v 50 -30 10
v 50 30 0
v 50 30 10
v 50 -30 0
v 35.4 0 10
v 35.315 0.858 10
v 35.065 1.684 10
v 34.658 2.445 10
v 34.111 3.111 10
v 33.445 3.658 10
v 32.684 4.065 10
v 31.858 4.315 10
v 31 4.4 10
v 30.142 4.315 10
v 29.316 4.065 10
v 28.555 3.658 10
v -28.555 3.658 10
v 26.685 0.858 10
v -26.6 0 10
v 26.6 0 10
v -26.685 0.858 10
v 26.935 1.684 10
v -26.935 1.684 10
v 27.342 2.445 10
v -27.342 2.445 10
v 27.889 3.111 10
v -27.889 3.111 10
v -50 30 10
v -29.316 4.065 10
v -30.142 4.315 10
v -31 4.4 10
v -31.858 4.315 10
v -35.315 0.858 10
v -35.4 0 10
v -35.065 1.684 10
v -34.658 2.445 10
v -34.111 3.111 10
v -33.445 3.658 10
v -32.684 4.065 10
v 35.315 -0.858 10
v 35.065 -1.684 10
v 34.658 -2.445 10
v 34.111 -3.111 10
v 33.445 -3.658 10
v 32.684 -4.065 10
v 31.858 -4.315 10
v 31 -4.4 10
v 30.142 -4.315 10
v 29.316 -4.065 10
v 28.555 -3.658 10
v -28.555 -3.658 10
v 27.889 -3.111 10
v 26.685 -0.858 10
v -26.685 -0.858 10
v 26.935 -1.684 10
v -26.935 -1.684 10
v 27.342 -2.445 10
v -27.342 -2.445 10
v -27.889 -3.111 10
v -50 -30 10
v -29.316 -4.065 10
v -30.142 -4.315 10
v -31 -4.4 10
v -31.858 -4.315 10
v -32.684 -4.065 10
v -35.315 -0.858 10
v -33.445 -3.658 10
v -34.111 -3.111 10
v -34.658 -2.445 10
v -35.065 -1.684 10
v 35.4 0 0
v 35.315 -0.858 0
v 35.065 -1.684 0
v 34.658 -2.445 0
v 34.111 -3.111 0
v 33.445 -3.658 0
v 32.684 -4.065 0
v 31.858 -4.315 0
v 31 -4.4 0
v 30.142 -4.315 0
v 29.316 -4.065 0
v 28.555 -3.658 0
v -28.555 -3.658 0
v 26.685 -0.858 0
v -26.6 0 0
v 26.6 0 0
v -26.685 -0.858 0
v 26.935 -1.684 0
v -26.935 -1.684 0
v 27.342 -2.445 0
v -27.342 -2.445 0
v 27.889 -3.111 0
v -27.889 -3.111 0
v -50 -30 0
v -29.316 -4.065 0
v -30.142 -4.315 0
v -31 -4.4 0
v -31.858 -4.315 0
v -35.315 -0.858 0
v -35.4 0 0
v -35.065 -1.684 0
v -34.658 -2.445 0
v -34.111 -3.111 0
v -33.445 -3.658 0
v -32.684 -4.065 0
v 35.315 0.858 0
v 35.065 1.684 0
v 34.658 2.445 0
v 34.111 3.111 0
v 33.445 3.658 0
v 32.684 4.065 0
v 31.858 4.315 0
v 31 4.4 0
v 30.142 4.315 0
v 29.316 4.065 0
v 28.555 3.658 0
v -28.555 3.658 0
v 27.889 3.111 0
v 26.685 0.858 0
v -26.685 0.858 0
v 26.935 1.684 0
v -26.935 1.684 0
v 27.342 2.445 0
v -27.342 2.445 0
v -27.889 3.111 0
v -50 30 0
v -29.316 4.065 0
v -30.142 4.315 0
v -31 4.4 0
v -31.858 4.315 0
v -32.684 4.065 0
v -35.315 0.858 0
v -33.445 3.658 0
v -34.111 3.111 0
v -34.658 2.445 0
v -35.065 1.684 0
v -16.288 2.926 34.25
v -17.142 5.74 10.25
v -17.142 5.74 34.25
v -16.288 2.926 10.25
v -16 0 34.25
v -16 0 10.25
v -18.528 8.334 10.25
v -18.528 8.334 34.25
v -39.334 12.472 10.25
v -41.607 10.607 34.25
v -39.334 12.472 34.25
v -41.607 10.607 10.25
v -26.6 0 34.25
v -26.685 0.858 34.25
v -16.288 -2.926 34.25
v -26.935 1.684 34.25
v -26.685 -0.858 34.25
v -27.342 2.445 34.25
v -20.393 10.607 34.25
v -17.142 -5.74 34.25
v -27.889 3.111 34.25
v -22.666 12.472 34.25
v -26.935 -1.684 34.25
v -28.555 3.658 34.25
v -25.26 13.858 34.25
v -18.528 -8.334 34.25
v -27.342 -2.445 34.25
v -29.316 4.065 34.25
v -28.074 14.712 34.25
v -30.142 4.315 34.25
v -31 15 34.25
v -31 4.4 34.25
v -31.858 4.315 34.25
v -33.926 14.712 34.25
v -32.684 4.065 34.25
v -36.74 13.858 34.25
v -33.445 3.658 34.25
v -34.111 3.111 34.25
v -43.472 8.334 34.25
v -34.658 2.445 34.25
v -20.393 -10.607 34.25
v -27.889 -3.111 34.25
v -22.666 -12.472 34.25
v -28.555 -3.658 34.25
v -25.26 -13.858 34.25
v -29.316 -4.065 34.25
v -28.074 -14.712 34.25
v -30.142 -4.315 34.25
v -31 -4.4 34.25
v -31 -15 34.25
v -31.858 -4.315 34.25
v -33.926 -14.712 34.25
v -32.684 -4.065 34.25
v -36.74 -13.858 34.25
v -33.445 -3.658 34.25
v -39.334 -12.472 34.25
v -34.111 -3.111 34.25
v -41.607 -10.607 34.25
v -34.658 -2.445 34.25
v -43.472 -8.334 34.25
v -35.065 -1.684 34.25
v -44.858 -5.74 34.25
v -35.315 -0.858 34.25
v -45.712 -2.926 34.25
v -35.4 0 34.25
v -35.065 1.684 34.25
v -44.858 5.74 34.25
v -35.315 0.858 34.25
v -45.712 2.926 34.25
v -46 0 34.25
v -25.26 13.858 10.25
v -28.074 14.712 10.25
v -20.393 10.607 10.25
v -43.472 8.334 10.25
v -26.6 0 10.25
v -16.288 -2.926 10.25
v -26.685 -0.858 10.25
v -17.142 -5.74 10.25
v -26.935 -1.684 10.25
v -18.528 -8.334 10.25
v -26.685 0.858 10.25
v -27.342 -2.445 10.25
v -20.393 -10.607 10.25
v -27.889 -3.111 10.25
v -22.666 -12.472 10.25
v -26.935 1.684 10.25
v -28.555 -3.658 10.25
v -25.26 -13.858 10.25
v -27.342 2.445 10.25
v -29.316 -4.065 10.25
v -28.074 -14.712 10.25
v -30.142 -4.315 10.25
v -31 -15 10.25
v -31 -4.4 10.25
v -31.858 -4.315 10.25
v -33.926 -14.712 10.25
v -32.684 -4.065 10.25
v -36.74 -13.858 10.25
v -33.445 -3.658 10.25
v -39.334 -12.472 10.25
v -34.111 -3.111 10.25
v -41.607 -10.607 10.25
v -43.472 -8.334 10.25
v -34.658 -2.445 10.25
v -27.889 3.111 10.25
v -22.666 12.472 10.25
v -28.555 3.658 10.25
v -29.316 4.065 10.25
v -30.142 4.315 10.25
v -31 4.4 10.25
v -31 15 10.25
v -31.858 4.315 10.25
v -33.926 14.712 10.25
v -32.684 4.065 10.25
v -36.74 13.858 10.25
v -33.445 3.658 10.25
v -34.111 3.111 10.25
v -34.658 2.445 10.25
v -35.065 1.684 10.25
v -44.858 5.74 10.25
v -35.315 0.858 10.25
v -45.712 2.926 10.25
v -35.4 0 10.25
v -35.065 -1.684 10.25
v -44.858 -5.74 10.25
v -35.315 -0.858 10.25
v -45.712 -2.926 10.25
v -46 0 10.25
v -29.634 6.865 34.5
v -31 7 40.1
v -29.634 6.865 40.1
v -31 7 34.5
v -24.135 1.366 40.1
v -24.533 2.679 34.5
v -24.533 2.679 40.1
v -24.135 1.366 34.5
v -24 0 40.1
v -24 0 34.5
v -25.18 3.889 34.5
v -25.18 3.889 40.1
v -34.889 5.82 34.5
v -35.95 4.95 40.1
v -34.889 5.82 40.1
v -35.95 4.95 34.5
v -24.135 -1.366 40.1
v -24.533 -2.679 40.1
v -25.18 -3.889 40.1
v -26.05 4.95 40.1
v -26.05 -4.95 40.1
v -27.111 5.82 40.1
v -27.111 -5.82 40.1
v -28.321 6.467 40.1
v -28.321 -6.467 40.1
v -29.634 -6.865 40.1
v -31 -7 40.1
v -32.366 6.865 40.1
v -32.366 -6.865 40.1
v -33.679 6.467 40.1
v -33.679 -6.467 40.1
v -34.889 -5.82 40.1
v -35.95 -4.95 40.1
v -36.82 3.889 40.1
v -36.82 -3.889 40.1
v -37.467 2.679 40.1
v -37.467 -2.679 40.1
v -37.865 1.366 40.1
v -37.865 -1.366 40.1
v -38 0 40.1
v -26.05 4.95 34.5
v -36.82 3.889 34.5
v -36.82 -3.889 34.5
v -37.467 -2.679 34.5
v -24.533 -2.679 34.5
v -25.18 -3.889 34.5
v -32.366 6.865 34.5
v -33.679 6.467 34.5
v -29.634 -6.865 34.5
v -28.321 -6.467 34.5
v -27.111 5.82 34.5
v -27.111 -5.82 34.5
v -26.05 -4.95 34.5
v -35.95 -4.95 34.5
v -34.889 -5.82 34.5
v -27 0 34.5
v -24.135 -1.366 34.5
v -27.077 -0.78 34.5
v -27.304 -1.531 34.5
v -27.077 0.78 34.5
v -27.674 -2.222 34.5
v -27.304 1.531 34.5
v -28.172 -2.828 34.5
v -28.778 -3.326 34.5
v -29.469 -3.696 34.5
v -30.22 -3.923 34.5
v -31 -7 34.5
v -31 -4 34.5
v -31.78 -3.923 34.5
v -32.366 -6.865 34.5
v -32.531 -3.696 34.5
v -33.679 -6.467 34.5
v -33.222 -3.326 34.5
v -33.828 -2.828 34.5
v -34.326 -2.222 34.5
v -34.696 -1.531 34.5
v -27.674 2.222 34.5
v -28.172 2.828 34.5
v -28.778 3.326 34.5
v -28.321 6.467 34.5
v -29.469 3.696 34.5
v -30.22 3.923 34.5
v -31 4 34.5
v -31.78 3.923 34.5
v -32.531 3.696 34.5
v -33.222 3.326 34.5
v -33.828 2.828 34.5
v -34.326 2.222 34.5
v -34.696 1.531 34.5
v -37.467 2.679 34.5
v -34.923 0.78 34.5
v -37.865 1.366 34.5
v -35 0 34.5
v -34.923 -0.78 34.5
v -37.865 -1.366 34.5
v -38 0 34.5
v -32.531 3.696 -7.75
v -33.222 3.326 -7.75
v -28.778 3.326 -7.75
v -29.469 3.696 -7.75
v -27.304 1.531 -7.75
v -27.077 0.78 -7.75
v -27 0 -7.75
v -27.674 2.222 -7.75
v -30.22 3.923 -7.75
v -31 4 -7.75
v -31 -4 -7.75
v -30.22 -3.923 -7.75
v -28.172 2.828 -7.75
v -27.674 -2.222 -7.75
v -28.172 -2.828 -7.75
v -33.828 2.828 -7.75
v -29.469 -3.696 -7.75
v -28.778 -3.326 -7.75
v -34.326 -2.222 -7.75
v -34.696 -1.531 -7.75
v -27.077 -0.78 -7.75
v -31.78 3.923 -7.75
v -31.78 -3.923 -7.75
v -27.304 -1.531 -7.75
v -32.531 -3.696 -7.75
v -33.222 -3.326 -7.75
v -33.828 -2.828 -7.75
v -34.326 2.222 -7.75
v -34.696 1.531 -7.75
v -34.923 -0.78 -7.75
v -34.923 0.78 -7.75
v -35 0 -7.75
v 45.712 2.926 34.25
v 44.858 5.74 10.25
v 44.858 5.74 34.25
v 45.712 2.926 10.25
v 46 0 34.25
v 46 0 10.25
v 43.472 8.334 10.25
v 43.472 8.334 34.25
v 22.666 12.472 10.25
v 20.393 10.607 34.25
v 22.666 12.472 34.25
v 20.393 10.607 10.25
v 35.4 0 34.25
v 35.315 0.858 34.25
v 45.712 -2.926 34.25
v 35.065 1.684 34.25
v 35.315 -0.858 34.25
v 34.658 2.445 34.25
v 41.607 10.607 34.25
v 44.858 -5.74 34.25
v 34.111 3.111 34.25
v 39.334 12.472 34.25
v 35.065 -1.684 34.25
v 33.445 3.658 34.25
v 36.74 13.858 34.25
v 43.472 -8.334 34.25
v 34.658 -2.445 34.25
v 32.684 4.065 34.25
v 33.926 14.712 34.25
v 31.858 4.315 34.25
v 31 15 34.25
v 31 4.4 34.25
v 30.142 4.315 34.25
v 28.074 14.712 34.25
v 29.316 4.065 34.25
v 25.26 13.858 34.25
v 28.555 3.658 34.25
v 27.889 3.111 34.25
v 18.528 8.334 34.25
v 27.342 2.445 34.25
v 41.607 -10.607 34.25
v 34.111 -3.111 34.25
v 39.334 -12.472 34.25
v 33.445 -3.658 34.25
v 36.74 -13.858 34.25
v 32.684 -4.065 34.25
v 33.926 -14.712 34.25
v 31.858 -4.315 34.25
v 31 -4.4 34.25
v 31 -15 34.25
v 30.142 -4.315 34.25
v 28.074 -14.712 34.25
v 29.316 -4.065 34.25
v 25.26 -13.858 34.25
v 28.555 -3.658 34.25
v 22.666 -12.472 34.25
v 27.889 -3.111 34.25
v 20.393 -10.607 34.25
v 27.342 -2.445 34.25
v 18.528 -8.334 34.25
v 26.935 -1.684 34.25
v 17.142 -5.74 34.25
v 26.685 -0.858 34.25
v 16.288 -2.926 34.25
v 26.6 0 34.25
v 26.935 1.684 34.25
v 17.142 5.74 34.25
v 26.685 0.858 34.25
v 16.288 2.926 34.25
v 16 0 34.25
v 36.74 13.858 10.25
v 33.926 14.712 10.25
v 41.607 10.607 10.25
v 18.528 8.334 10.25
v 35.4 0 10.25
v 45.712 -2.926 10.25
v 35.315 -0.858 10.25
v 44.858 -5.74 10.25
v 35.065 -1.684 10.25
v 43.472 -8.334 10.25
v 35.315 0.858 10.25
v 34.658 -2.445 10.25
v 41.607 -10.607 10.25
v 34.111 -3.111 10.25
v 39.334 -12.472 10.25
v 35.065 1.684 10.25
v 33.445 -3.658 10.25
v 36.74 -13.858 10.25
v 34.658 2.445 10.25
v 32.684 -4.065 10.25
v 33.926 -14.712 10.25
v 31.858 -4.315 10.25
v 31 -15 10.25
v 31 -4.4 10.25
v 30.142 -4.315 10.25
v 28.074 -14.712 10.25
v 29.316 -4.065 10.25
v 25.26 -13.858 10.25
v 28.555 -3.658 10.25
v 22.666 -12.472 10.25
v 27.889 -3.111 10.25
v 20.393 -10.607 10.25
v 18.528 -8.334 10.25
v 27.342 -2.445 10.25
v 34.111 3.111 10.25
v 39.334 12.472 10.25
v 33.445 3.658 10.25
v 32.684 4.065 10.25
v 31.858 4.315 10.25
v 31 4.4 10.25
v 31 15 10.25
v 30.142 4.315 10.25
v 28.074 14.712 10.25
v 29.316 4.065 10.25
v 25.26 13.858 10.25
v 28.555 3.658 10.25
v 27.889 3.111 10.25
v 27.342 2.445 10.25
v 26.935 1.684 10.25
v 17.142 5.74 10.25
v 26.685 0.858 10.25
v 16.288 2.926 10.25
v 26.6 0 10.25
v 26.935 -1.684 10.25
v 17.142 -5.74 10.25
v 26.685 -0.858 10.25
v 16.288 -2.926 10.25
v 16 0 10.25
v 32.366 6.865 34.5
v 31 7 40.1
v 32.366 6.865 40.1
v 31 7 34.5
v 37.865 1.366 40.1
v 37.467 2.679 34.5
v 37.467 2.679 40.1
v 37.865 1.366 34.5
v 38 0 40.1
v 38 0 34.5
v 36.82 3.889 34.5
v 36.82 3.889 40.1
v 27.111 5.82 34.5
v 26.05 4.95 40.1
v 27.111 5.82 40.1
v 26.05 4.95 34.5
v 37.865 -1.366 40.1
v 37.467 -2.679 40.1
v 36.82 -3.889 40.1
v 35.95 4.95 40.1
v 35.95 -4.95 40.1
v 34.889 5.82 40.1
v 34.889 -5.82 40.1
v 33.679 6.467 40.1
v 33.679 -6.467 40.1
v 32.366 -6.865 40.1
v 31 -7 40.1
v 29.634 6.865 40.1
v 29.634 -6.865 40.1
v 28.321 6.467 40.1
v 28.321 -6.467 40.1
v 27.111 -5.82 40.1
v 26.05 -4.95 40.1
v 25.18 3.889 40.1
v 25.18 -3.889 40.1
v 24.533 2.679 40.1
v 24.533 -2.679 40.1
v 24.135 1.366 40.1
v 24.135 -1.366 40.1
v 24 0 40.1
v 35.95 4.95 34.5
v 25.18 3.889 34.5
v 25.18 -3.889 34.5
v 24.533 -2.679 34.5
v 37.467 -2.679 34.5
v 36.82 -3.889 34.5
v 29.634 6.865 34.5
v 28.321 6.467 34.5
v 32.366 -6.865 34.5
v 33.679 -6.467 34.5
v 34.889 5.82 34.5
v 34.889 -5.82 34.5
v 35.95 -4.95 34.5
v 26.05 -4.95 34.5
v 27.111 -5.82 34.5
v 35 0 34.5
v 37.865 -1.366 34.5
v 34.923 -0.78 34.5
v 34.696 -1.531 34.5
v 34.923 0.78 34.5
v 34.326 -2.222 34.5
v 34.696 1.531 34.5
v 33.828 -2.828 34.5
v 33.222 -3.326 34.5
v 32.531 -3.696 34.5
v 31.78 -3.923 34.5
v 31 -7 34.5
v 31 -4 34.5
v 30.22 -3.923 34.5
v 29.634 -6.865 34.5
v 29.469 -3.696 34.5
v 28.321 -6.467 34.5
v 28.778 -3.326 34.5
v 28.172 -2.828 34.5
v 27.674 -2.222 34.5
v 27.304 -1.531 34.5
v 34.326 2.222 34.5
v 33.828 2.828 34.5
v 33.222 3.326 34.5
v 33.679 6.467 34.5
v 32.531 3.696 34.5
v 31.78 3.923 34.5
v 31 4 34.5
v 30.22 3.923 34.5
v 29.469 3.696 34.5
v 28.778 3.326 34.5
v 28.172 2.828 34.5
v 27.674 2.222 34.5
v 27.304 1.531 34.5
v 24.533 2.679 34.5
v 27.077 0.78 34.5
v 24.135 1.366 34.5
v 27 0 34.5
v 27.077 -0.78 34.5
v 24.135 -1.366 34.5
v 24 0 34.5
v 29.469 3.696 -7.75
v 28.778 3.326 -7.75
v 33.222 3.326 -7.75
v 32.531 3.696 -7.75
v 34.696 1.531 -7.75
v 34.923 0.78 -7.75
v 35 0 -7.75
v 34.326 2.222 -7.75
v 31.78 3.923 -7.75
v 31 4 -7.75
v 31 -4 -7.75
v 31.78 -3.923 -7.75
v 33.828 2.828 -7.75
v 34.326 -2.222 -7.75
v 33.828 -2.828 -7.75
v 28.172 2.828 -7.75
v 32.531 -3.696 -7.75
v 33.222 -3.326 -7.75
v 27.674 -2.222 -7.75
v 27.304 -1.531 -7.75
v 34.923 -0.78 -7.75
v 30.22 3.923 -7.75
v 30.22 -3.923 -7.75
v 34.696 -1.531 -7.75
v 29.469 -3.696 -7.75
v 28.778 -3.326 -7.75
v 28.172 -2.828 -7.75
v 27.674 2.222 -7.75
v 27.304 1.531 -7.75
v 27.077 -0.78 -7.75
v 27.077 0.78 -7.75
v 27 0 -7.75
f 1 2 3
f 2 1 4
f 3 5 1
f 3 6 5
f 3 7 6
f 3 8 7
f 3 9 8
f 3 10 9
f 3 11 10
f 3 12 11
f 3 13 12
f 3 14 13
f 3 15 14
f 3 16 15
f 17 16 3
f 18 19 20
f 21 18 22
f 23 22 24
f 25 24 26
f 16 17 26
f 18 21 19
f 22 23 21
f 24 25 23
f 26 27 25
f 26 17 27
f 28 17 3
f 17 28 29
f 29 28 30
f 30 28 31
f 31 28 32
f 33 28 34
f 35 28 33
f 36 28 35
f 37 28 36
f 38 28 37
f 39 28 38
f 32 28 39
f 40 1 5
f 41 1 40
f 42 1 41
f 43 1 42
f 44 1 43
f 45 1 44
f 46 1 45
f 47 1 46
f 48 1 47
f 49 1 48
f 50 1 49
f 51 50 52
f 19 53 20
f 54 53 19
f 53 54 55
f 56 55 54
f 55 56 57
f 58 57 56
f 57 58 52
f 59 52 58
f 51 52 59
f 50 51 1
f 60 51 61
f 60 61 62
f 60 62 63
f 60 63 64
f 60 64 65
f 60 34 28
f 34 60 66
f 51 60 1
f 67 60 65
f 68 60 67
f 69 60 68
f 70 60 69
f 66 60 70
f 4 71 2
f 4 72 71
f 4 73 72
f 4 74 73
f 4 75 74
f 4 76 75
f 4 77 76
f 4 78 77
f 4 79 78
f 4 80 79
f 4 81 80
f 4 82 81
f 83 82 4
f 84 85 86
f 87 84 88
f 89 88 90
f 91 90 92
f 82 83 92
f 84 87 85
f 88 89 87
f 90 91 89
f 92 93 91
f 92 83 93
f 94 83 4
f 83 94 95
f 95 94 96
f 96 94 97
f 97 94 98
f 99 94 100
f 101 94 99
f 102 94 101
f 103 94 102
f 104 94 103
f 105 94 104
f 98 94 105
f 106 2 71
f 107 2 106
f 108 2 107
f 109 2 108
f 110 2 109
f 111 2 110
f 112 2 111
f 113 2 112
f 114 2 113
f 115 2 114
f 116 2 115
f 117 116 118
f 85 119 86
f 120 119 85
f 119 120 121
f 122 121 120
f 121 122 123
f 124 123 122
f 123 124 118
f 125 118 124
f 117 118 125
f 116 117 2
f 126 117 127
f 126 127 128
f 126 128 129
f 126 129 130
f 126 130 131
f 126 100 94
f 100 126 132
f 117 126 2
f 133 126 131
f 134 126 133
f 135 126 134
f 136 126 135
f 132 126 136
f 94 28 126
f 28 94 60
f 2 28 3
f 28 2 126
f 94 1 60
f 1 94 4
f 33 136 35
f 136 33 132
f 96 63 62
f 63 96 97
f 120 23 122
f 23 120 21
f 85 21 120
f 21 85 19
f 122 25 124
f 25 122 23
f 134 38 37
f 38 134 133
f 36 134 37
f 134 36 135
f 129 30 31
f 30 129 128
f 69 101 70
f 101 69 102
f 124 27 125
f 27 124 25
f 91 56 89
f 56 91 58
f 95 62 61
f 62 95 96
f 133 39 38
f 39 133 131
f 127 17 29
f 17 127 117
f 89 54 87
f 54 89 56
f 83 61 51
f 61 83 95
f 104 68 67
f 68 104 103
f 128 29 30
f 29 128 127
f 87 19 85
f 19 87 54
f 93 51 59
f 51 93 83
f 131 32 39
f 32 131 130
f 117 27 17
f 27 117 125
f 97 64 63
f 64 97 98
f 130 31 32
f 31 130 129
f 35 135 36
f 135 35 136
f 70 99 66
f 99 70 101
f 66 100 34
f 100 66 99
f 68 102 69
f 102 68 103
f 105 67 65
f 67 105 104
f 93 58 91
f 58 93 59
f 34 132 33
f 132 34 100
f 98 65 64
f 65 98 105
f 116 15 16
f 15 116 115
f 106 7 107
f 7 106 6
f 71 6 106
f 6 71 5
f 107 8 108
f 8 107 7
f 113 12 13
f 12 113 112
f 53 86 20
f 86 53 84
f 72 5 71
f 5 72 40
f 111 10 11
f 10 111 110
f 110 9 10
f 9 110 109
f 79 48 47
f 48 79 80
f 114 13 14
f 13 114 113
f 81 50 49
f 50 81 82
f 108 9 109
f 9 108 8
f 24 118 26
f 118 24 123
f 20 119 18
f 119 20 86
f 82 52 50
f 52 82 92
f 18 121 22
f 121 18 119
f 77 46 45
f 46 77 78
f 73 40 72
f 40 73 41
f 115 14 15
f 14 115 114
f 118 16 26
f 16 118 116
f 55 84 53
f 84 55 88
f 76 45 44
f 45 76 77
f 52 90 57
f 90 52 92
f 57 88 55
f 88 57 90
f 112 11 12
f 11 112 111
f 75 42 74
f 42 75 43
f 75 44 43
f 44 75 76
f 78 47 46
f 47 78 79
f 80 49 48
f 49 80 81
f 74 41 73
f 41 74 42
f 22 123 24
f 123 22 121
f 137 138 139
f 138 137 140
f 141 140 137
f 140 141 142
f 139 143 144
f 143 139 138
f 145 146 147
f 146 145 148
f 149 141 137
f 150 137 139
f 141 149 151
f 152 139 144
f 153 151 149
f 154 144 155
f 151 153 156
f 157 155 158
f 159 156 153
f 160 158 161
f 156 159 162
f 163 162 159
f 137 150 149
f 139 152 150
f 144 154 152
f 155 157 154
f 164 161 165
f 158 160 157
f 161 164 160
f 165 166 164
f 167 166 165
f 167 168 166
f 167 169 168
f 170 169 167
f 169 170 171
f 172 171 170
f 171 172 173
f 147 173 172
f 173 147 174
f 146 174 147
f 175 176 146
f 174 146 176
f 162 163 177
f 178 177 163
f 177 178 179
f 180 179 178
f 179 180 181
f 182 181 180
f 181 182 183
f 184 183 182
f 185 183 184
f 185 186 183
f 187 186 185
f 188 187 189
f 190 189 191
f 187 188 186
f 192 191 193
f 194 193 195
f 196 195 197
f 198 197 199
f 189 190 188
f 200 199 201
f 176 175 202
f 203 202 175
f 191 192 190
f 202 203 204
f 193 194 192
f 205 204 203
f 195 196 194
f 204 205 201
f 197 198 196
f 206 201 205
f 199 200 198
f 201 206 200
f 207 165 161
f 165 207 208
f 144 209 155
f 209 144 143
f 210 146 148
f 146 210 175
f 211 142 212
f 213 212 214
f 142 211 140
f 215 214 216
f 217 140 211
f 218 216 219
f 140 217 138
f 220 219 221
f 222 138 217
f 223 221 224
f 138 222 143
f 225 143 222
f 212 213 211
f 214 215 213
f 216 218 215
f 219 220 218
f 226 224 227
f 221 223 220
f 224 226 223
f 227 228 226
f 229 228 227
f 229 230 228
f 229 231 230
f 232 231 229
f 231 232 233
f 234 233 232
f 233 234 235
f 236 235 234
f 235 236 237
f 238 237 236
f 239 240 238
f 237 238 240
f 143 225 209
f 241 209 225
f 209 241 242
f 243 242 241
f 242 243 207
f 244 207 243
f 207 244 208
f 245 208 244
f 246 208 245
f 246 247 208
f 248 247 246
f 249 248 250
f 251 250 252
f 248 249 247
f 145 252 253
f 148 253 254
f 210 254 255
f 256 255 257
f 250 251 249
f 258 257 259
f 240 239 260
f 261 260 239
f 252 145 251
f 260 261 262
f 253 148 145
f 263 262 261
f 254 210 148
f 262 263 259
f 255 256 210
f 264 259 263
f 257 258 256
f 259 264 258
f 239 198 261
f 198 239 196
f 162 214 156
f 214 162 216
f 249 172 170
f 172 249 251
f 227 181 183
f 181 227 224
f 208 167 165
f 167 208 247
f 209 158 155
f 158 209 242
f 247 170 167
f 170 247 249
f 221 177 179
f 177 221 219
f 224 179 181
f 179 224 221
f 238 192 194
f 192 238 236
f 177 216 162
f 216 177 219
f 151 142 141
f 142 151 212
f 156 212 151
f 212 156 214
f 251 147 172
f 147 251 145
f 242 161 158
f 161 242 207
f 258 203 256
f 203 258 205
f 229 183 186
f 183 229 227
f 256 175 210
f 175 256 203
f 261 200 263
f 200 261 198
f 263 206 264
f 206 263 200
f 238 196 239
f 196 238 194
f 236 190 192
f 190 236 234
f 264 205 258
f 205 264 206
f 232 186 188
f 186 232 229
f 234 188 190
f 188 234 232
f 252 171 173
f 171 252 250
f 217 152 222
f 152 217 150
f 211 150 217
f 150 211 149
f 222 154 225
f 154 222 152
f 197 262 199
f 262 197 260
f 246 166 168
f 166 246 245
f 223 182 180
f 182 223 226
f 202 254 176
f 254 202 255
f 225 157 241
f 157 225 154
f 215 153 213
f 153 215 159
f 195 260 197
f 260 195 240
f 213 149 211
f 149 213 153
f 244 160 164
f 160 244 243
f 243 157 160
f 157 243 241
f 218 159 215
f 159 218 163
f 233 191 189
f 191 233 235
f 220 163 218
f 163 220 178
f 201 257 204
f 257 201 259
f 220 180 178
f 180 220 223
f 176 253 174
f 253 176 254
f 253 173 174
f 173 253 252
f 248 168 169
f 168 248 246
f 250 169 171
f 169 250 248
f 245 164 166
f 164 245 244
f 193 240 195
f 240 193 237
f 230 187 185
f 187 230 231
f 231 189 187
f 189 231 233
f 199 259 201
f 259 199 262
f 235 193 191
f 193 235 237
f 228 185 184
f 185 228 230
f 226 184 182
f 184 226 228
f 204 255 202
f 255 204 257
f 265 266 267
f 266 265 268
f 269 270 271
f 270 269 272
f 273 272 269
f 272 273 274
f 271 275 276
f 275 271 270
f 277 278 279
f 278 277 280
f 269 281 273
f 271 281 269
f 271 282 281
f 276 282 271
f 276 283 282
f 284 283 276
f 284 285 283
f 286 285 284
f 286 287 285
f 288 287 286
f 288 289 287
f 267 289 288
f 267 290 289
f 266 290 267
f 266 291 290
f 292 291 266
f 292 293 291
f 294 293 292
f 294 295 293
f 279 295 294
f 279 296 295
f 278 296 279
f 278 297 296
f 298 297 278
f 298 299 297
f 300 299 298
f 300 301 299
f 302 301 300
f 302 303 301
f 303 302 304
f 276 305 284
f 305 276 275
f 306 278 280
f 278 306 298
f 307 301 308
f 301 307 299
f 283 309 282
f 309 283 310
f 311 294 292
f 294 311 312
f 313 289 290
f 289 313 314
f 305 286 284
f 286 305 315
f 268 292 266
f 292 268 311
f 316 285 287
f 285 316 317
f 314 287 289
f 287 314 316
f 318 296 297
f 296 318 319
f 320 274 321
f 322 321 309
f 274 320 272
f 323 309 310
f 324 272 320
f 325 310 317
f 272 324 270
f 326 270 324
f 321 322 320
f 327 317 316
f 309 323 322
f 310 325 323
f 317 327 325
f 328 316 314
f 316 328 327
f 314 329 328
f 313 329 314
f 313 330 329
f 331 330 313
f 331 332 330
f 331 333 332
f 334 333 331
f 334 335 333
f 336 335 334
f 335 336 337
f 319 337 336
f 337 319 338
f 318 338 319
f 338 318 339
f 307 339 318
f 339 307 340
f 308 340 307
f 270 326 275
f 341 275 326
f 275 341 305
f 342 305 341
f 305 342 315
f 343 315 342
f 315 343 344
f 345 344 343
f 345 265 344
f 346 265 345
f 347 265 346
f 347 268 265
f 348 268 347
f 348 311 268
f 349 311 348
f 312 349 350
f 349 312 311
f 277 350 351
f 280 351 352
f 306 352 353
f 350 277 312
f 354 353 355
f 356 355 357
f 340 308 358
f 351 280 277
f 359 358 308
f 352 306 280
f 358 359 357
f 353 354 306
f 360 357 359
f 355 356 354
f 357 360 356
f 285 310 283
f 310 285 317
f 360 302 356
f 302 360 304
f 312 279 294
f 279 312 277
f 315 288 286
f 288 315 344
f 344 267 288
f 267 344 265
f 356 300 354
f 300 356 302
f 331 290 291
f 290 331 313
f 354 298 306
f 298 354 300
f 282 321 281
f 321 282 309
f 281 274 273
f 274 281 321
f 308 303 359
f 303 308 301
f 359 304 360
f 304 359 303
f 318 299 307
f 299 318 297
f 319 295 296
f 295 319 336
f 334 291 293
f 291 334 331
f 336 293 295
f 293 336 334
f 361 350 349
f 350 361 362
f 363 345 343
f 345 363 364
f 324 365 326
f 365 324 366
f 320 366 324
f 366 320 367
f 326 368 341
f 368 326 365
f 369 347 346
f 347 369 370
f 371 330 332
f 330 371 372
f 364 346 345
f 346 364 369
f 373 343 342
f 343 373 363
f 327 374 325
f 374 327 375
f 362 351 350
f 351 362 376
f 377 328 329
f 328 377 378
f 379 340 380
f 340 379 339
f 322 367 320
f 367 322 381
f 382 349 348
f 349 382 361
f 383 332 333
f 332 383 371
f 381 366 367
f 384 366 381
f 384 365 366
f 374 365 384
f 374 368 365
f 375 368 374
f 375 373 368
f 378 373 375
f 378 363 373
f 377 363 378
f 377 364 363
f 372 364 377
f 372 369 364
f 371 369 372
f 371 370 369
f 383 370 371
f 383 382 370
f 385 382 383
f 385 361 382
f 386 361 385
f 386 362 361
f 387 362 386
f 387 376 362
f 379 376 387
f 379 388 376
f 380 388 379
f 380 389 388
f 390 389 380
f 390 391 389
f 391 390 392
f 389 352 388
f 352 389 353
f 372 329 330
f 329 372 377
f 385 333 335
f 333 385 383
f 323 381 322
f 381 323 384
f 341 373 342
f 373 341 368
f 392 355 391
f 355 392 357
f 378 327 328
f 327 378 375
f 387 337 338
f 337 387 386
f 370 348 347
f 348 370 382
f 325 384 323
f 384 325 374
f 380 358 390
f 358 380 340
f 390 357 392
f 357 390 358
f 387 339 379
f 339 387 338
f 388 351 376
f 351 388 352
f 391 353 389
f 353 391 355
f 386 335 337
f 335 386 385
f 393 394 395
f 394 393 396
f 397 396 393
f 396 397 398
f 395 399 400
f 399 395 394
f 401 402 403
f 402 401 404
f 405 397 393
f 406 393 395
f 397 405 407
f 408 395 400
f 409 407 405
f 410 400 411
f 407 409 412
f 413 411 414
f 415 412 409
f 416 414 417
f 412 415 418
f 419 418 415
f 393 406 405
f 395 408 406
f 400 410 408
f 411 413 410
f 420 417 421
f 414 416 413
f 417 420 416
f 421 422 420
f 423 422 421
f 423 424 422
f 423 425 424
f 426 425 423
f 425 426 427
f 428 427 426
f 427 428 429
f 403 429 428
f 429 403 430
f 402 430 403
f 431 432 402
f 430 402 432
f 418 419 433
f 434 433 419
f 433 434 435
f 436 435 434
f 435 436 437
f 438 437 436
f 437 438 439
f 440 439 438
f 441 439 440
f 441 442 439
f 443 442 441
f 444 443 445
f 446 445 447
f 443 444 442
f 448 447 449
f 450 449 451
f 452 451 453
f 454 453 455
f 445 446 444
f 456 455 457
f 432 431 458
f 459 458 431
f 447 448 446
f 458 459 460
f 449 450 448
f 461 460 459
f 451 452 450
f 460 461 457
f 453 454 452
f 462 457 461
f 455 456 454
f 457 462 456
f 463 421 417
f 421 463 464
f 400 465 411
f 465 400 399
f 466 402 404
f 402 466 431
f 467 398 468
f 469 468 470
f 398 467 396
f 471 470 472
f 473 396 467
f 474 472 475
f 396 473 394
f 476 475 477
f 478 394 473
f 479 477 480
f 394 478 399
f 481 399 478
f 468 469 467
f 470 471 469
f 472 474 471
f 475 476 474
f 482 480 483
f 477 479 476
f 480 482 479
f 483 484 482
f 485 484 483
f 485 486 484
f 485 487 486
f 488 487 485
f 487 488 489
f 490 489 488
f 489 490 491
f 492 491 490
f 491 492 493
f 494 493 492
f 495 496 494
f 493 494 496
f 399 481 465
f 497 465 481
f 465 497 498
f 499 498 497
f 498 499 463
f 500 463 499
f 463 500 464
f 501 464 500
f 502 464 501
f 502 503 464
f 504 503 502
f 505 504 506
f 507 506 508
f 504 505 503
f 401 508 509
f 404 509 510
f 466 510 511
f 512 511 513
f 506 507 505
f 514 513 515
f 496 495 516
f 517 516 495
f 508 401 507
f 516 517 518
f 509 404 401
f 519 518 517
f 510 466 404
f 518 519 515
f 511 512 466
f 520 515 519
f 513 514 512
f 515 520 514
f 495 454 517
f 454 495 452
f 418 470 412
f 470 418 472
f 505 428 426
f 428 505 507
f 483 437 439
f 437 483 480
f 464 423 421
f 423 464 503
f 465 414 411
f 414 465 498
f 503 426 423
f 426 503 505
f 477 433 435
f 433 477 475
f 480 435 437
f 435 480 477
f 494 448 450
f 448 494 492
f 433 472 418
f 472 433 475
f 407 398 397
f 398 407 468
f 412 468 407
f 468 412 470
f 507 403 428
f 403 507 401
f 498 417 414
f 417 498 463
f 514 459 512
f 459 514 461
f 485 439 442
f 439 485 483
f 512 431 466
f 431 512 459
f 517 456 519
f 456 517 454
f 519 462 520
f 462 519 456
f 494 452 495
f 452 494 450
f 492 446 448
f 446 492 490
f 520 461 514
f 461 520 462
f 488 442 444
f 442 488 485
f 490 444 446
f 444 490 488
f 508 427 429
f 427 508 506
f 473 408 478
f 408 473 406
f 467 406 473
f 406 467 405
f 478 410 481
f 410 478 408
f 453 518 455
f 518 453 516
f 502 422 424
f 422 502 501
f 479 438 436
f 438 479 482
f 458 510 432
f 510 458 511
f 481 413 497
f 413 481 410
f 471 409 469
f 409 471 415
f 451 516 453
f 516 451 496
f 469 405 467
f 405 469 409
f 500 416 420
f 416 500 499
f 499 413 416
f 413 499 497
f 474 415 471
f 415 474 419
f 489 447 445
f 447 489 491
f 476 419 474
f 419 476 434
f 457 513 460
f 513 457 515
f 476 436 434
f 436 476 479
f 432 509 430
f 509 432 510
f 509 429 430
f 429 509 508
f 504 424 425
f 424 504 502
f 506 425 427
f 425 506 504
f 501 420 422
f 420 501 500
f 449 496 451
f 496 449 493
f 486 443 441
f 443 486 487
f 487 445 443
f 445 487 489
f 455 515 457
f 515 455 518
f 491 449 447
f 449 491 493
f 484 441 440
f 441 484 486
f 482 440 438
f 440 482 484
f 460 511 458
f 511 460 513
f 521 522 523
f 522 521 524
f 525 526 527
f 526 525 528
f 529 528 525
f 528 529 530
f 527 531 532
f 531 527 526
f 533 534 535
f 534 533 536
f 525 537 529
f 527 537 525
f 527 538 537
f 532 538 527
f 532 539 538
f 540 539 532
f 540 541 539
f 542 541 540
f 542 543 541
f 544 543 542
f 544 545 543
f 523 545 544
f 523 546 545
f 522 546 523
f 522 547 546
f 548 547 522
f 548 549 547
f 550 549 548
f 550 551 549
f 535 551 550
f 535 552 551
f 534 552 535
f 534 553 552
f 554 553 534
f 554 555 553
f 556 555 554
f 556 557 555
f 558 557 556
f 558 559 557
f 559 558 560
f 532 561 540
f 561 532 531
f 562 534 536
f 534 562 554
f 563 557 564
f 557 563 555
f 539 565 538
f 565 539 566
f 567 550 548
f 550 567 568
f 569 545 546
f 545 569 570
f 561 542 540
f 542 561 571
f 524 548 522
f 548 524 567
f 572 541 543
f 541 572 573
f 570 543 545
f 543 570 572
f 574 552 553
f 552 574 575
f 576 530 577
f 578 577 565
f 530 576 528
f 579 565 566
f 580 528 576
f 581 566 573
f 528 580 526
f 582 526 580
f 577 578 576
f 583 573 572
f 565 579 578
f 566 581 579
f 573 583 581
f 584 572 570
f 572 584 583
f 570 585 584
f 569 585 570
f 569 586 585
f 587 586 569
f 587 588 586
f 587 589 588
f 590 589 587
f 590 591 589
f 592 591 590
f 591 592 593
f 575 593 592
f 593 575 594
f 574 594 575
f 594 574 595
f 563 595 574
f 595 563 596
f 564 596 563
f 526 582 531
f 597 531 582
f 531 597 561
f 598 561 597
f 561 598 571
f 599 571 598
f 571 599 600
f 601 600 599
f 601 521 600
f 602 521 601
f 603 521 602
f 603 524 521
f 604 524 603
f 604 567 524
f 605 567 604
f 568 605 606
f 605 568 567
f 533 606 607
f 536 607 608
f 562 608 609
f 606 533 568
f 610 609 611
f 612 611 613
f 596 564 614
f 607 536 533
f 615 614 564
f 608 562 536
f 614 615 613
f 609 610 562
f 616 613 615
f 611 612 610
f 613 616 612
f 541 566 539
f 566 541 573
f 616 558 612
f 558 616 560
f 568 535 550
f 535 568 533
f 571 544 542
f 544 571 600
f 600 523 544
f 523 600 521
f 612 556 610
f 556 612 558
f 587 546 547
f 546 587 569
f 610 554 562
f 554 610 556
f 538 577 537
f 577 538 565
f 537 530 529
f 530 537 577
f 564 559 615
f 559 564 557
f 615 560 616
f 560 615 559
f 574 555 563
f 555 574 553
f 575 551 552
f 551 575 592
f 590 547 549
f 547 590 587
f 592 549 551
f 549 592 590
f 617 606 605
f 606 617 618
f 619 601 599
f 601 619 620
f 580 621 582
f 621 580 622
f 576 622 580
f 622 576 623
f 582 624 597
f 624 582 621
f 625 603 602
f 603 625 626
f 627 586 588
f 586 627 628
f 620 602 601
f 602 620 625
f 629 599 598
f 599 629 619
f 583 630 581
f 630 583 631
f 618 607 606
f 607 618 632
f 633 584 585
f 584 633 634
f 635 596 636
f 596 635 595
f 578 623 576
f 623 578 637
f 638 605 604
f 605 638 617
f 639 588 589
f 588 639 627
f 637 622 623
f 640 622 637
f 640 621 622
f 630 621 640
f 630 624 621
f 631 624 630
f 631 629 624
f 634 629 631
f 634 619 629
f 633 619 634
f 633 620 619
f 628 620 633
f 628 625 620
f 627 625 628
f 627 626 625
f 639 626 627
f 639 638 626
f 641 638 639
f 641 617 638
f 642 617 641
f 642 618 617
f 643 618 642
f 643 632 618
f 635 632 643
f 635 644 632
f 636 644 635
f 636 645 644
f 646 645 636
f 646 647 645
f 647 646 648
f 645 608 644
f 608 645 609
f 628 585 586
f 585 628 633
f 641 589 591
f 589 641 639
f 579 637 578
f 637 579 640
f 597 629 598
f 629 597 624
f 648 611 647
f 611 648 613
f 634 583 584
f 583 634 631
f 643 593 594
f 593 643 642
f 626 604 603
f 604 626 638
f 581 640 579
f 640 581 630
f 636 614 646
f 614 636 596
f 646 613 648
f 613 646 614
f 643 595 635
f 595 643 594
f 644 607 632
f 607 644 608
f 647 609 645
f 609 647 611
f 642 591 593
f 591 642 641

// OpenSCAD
$fn = 32;

// ------------------------------------------------------------------------
// Standoff columns: 2 d30 standoffs, bolts d8
// Every part is its own module, assembly() places them once.
// ------------------------------------------------------------------------

// --- part 1 ---
module base_plate() {
  difference() {
    translate([-50, -30, 0]) cube([100, 60, 10]);
    translate([-31, 0, -1]) cylinder(h = 12, d = 8.8);
    translate([31, 0, -1]) cylinder(h = 12, d = 8.8);
  }
}

// --- part 2 ---
module spacer1() {
  difference() {
      translate([0, 0, 0]) cylinder(h = 24, d = 30);
      translate([0, 0, -1]) cylinder(h = 26, d = 8.8);
    }
}

// --- part 3 ---
module bolt1() {
  cylinder(h = 5.6, d = 14);
  translate([0, 0, -42.25]) cylinder(h = 42.25, d = 8);
}

// --- part 4 ---
module spacer2() {
  difference() {
      translate([0, 0, 0]) cylinder(h = 24, d = 30);
      translate([0, 0, -1]) cylinder(h = 26, d = 8.8);
    }
}

// --- part 5 ---
module bolt2() {
  cylinder(h = 5.6, d = 14);
  translate([0, 0, -42.25]) cylinder(h = 42.25, d = 8);
}

// --- assembly ---
module assembly() {
  translate([0, 0, 0]) rotate([0, 0, 0]) base_plate();
  translate([-31, 0, 10.25]) rotate([0, 0, 0]) spacer1();
  translate([-31, 0, 34.5]) rotate([0, 0, 0]) bolt1();
  translate([31, 0, 10.25]) rotate([0, 0, 0]) spacer2();
  translate([31, 0, 34.5]) rotate([0, 0, 0]) bolt2();
}

assembly();
